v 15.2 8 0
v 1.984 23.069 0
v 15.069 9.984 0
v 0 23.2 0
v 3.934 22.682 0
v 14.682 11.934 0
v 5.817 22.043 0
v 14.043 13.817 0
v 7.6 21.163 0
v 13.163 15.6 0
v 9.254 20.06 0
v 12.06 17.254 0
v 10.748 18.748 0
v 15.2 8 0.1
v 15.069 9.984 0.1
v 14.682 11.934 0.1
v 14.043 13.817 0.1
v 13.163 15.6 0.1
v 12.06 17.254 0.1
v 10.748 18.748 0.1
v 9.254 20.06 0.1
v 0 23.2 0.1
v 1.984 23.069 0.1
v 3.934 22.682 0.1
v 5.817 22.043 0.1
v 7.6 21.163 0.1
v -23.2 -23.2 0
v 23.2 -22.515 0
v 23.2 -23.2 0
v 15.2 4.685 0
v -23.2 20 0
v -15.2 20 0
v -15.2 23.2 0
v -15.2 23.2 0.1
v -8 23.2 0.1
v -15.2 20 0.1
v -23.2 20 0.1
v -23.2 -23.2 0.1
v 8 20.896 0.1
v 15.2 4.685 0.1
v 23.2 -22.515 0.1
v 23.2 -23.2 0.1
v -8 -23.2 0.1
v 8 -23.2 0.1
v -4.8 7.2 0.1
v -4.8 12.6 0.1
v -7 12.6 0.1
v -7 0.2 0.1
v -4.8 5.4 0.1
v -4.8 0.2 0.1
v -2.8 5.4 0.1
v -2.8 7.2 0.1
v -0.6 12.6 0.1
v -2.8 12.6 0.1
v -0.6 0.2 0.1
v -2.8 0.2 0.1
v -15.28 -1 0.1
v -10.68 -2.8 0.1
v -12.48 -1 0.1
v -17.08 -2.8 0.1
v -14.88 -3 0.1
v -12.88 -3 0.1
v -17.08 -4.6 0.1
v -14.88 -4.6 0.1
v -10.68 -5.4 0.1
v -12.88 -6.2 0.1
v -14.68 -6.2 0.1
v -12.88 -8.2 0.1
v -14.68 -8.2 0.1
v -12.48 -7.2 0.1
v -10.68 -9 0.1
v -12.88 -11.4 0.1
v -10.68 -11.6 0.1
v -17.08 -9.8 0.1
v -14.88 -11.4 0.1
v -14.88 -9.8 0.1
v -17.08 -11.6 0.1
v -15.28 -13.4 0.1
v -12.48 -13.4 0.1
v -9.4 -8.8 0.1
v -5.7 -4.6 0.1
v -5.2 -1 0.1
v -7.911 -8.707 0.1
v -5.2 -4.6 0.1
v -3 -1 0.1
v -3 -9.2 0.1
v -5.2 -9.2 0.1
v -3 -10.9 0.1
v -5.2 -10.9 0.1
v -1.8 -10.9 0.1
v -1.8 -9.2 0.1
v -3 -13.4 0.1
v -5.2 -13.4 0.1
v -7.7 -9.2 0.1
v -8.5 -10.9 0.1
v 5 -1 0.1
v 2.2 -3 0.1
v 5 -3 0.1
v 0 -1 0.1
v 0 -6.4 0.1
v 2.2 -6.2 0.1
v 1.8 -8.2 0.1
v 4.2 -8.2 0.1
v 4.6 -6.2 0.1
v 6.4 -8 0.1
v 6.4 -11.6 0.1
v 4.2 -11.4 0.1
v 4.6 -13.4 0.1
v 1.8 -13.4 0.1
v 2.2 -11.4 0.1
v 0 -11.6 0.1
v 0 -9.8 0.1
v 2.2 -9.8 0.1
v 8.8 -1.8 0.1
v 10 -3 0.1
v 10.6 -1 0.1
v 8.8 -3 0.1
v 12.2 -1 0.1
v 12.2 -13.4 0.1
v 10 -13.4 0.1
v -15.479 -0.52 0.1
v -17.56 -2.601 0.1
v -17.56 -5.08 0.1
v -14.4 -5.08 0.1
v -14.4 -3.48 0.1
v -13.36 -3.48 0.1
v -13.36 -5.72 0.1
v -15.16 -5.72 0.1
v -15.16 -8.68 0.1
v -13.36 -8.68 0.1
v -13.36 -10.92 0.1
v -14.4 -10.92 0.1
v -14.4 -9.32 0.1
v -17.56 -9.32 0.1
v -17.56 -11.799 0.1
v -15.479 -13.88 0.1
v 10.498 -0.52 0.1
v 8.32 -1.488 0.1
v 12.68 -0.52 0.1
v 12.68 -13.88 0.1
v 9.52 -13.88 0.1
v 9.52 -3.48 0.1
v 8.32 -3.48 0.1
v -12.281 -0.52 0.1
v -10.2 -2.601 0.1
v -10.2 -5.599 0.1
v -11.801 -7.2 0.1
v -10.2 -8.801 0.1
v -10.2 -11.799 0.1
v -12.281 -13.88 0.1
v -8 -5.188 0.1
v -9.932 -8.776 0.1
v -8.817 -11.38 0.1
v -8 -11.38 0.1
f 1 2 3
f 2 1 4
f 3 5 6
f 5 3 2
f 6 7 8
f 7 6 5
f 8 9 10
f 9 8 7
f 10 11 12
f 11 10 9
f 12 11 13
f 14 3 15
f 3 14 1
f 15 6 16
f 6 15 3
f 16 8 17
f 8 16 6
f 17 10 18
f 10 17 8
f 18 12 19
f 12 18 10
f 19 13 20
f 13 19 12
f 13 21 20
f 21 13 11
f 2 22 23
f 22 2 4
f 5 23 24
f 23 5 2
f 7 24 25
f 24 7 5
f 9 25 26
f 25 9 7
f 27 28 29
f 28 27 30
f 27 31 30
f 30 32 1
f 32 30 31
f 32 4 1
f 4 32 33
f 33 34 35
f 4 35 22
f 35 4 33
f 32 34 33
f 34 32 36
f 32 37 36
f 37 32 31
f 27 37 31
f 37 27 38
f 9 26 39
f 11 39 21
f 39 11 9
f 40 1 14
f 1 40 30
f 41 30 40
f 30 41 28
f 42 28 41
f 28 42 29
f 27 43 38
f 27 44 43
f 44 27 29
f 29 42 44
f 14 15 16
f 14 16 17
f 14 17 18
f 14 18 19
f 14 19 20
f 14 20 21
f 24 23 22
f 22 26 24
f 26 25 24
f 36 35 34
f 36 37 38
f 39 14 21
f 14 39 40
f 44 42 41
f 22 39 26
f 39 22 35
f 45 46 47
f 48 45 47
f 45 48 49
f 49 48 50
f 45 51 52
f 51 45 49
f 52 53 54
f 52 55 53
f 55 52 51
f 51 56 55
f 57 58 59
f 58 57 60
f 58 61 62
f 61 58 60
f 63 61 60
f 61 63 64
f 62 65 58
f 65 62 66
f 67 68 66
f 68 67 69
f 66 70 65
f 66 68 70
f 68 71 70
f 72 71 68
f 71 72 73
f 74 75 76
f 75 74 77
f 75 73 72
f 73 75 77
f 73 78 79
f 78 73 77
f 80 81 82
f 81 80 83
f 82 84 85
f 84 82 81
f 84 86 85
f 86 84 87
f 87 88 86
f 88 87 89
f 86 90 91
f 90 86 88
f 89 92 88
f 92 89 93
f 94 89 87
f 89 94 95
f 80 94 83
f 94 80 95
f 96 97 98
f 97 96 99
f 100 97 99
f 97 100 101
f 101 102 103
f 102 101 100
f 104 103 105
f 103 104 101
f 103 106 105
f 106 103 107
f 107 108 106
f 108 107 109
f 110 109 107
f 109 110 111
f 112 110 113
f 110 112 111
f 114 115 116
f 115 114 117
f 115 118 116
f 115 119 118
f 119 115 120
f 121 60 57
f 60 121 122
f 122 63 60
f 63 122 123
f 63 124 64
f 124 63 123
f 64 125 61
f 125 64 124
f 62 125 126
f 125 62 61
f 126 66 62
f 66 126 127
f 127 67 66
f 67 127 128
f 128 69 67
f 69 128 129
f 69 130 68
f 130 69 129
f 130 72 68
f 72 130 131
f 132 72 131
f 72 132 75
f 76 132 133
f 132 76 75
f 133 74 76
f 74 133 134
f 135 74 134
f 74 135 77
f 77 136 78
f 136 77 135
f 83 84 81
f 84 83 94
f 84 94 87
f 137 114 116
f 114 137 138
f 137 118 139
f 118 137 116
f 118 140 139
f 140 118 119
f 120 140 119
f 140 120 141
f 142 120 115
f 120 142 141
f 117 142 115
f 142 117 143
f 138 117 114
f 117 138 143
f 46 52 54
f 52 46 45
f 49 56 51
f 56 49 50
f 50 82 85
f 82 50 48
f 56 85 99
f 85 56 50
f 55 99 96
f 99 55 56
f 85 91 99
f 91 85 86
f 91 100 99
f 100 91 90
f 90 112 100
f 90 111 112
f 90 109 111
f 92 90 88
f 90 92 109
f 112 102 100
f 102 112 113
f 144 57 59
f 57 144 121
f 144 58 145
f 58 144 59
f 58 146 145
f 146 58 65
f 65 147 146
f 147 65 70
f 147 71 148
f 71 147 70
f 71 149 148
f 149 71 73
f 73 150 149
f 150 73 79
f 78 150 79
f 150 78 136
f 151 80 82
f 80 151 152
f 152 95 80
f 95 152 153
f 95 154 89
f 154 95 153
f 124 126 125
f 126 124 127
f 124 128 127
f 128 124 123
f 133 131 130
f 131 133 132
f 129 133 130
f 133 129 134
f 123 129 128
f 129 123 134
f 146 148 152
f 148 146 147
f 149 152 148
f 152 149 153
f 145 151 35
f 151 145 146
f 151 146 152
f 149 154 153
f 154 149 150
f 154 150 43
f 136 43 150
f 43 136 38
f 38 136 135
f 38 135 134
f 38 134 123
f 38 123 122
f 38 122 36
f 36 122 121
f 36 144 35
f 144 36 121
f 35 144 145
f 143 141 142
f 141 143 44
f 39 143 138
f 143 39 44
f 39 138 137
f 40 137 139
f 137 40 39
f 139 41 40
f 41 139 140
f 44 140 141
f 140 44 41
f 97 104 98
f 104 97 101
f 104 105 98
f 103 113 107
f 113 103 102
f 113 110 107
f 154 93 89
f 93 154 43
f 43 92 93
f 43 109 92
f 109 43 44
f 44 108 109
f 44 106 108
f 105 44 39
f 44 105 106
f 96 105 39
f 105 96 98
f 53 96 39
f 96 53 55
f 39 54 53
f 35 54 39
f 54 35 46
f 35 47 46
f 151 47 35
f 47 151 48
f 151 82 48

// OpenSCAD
// file: ../p/48/7-48cyli.scad
use <../../lib.scad>
function ldraw_lib__48__7_48cyli() = [
// 0 Hi-Res Cylinder 0.1458
// 0 Name: 48\7-48cyli.dat
// 0 Author: Philippe Hurbain [Philo]
// 0 !LDRAW_ORG 48_Primitive UPDATE 2013-01
// 0 !LICENSE Licensed under CC BY 4.0 : see CAreadme.txt
// 
// 0 BFC CERTIFY CCW
  [0,"BFC","CERTIFY"],
  [0,"BFC","CCW"],
// 
// 0 !HISTORY 2013-07-21 [PTadmin] Official Update 2013-01
// 
// 
// 4 16 0.9914 0 0.1305 1 0 0 1 1 0 0.9914 1 0.1305
  [4,16,0.9914,0,0.1305,1,0,0,1,1,0,0.9914,1,0.1305],
// 4 16 0.9659 0 0.2588 0.9914 0 0.1305 0.9914 1 0.1305 0.9659 1 0.2588
  [4,16,0.9659,0,0.2588,0.9914,0,0.1305,0.9914,1,0.1305,0.9659,1,0.2588],
// 4 16 0.9239 0 0.3827 0.9659 0 0.2588 0.9659 1 0.2588 0.9239 1 0.3827
  [4,16,0.9239,0,0.3827,0.9659,0,0.2588,0.9659,1,0.2588,0.9239,1,0.3827],
// 4 16 0.866 0 0.5 0.9239 0 0.3827 0.9239 1 0.3827 0.866 1 0.5
  [4,16,0.866,0,0.5,0.9239,0,0.3827,0.9239,1,0.3827,0.866,1,0.5],
// 4 16 0.7934 0 0.6088 0.866 0 0.5 0.866 1 0.5 0.7934 1 0.6088
  [4,16,0.7934,0,0.6088,0.866,0,0.5,0.866,1,0.5,0.7934,1,0.6088],
// 4 16 0.7071 0 0.7071 0.7934 0 0.6088 0.7934 1 0.6088 0.7071 1 0.7071
  [4,16,0.7071,0,0.7071,0.7934,0,0.6088,0.7934,1,0.6088,0.7071,1,0.7071],
// 4 16 0.6088 0 0.7934 0.7071 0 0.7071 0.7071 1 0.7071 0.6088 1 0.7934
  [4,16,0.6088,0,0.7934,0.7071,0,0.7071,0.7071,1,0.7071,0.6088,1,0.7934],
// 0 // conditional lines
// 5 24 1 1 0 1 0 0 1 1 -0.1317 0.9914 1 0.1305
  [5,24,1,1,0,1,0,0,1,1,-0.1317,0.9914,1,0.1305],
// 5 24 0.9914 1 0.1305 0.9914 0 0.1305 1 1 0 0.9659 1 0.2588
  [5,24,0.9914,1,0.1305,0.9914,0,0.1305,1,1,0,0.9659,1,0.2588],
// 5 24 0.9659 1 0.2588 0.9659 0 0.2588 0.9914 1 0.1305 0.9239 1 0.3827
  [5,24,0.9659,1,0.2588,0.9659,0,0.2588,0.9914,1,0.1305,0.9239,1,0.3827],
// 5 24 0.9239 1 0.3827 0.9239 0 0.3827 0.9659 1 0.2588 0.866 1 0.5
  [5,24,0.9239,1,0.3827,0.9239,0,0.3827,0.9659,1,0.2588,0.866,1,0.5],
// 5 24 0.866 1 0.5 0.866 0 0.5 0.9239 1 0.3827 0.7934 1 0.6088
  [5,24,0.866,1,0.5,0.866,0,0.5,0.9239,1,0.3827,0.7934,1,0.6088],
// 5 24 0.7934 1 0.6088 0.7934 0 0.6088 0.866 1 0.5 0.7071 1 0.7071
  [5,24,0.7934,1,0.6088,0.7934,0,0.6088,0.866,1,0.5,0.7071,1,0.7071],
// 5 24 0.7071 1 0.7071 0.7071 0 0.7071 0.7934 1 0.6088 0.6088 1 0.7934
  [5,24,0.7071,1,0.7071,0.7071,0,0.7071,0.7934,1,0.6088,0.6088,1,0.7934],
// 5 24 0.6088 1 0.7934 0.6088 0 0.7934 0.7071 1 0.7071 0.5043 1 0.8735
  [5,24,0.6088,1,0.7934,0.6088,0,0.7934,0.7071,1,0.7071,0.5043,1,0.8735],
// 0 // Build by Primitive Generator 2
];
module ldraw_lib__48__7_48cyli(step=0, col=false, unit=2/5, alt=false, line=0.2, solid=!$preview)
    makepoly(ldraw_lib__48__7_48cyli(), step=step, col=col, unit=unit, alt=alt, line=line, solid=solid);
ldraw_lib__48__7_48cyli(line=0.2);
// file: ../p/48/7-48chrd.scad
use <../../lib.scad>
function ldraw_lib__48__7_48chrd() = [
// 0 Hi-Res Chord 0.1458
// 0 Name: 48\7-48chrd.dat
// 0 Author: Philippe Hurbain [Philo]
// 0 !LDRAW_ORG 48_Primitive UPDATE 2013-01
// 0 !LICENSE Licensed under CC BY 4.0 : see CAreadme.txt
// 
// 0 BFC CERTIFY CCW
  [0,"BFC","CERTIFY"],
  [0,"BFC","CCW"],
// 
// 0 !HISTORY 2013-07-21 [PTadmin] Official Update 2013-01
// 
// 
// 3 16 1 0 0 0.9914 0 0.1305 0.9659 0 0.2588
  [3,16,1,0,0,0.9914,0,0.1305,0.9659,0,0.2588],
// 3 16 1 0 0 0.9659 0 0.2588 0.9239 0 0.3827
  [3,16,1,0,0,0.9659,0,0.2588,0.9239,0,0.3827],
// 3 16 1 0 0 0.9239 0 0.3827 0.866 0 0.5
  [3,16,1,0,0,0.9239,0,0.3827,0.866,0,0.5],
// 3 16 1 0 0 0.866 0 0.5 0.7934 0 0.6088
  [3,16,1,0,0,0.866,0,0.5,0.7934,0,0.6088],
// 3 16 1 0 0 0.7934 0 0.6088 0.7071 0 0.7071
  [3,16,1,0,0,0.7934,0,0.6088,0.7071,0,0.7071],
// 3 16 1 0 0 0.7071 0 0.7071 0.6088 0 0.7934
  [3,16,1,0,0,0.7071,0,0.7071,0.6088,0,0.7934],
// 0 // Build by Primitive Generator 2
];
module ldraw_lib__48__7_48chrd(step=0, col=false, unit=2/5, alt=false, line=0.2, solid=!$preview)
    makepoly(ldraw_lib__48__7_48chrd(), step=step, col=col, unit=unit, alt=alt, line=line, solid=solid);
ldraw_lib__48__7_48chrd(line=0.2);
// file: ../p/48/1-4chrd.scad
use <../../lib.scad>
function ldraw_lib__48__1_4chrd() = [
// 0 Hi-Res Chord 0.25
// 0 Name: 48\1-4chrd.dat
// 0 Author: Willy Tschager [Holly-Wood]
// 0 !LDRAW_ORG 48_Primitive UPDATE 2024-01
// 0 !LICENSE Licensed under CC BY 4.0 : see CAreadme.txt
// 
// 0 BFC CERTIFY CCW
  [0,"BFC","CERTIFY"],
  [0,"BFC","CCW"],
// 
// 0 !HISTORY 2009-05-02 [PTadmin] Official Update 2009-01
// 0 !HISTORY 2012-08-02 [MMR1988] Re-creation with PrimGen2 and Rectifier
// 0 !HISTORY 2012-08-09 [PTadmin] Official Update 2012-02
// 0 !HISTORY 2024-01-04 [Holly-Wood] Complete re-write, original by westrate
// 0 !HISTORY 2024-01-29 [OrionP] Official Update 2024-01
// 
// 0 // Vertices calculated by LDPartEditor (PrimGen 2.X)
// 
// 4 16 0 0 1 1 0 0 .9914 0 .1305 .1305 0 .9914
  [4,16,0,0,1,1,0,0,.9914,0,.1305,.1305,0,.9914],
// 4 16 .1305 0 .9914 .9914 0 .1305 .9659 0 .2588 .2588 0 .9659
  [4,16,.1305,0,.9914,.9914,0,.1305,.9659,0,.2588,.2588,0,.9659],
// 4 16 .2588 0 .9659 .9659 0 .2588 .9239 0 .3827 .3827 0 .9239
  [4,16,.2588,0,.9659,.9659,0,.2588,.9239,0,.3827,.3827,0,.9239],
// 4 16 .3827 0 .9239 .9239 0 .3827 .866 0 .5 .5 0 .866
  [4,16,.3827,0,.9239,.9239,0,.3827,.866,0,.5,.5,0,.866],
// 4 16 .5 0 .866 .866 0 .5 .7934 0 .6088 .6088 0 .7934
  [4,16,.5,0,.866,.866,0,.5,.7934,0,.6088,.6088,0,.7934],
// 3 16 .6088 0 .7934 .7934 0 .6088 .7071 0 .7071
  [3,16,.6088,0,.7934,.7934,0,.6088,.7071,0,.7071],
];
module ldraw_lib__48__1_4chrd(step=0, col=false, unit=2/5, alt=false, line=0.2, solid=!$preview)
    makepoly(ldraw_lib__48__1_4chrd(), step=step, col=col, unit=unit, alt=alt, line=line, solid=solid);
ldraw_lib__48__1_4chrd(line=0.2);
// file: ../p/48/1-12cyli.scad
use <../../lib.scad>
function ldraw_lib__48__1_12cyli() = [
// 0 Hi-Res Cylinder 0.0833
// 0 Name: 48\1-12cyli.dat
// 0 Author: Willy Tschager [Holly-Wood]
// 0 !LDRAW_ORG 48_Primitive UPDATE 2024-01
// 0 !LICENSE Licensed under CC BY 4.0 : see CAreadme.txt
// 
// 0 BFC CERTIFY CCW
  [0,"BFC","CERTIFY"],
  [0,"BFC","CCW"],
// 
// 0 !HISTORY 2009-05-02 [PTadmin] Official Update 2009-01
// 0 !HISTORY 2024-01-08 [Holly-Wood] Complete regeneration, original by westrate
// 0 !HISTORY 2024-01-29 [OrionP] Official Update 2024-01
// 
// 4 16 0.9914 0 0.1305 1 0 0 1 1 0 0.9914 1 0.1305
  [4,16,0.9914,0,0.1305,1,0,0,1,1,0,0.9914,1,0.1305],
// 4 16 0.9659 0 0.2588 0.9914 0 0.1305 0.9914 1 0.1305 0.9659 1 0.2588
  [4,16,0.9659,0,0.2588,0.9914,0,0.1305,0.9914,1,0.1305,0.9659,1,0.2588],
// 4 16 0.9239 0 0.3827 0.9659 0 0.2588 0.9659 1 0.2588 0.9239 1 0.3827
  [4,16,0.9239,0,0.3827,0.9659,0,0.2588,0.9659,1,0.2588,0.9239,1,0.3827],
// 4 16 0.866 0 0.5 0.9239 0 0.3827 0.9239 1 0.3827 0.866 1 0.5
  [4,16,0.866,0,0.5,0.9239,0,0.3827,0.9239,1,0.3827,0.866,1,0.5],
// 0 // conditional lines
// 5 24 1 1 0 1 0 0 1 1 -0.1317 0.9914 1 0.1305
  [5,24,1,1,0,1,0,0,1,1,-0.1317,0.9914,1,0.1305],
// 5 24 0.9914 1 0.1305 0.9914 0 0.1305 1 1 0 0.9659 1 0.2588
  [5,24,0.9914,1,0.1305,0.9914,0,0.1305,1,1,0,0.9659,1,0.2588],
// 5 24 0.9659 1 0.2588 0.9659 0 0.2588 0.9914 1 0.1305 0.9239 1 0.3827
  [5,24,0.9659,1,0.2588,0.9659,0,0.2588,0.9914,1,0.1305,0.9239,1,0.3827],
// 5 24 0.9239 1 0.3827 0.9239 0 0.3827 0.9659 1 0.2588 0.866 1 0.5
  [5,24,0.9239,1,0.3827,0.9239,0,0.3827,0.9659,1,0.2588,0.866,1,0.5],
// 5 24 0.866 1 0.5 0.866 0 0.5 0.9239 1 0.3827 0.8002 1 0.614
  [5,24,0.866,1,0.5,0.866,0,0.5,0.9239,1,0.3827,0.8002,1,0.614],
// 0 // Build by LDPartEditor (PrimGen 2.X)
];
module ldraw_lib__48__1_12cyli(step=0, col=false, unit=2/5, alt=false, line=0.2, solid=!$preview)
    makepoly(ldraw_lib__48__1_12cyli(), step=step, col=col, unit=unit, alt=alt, line=line, solid=solid);
ldraw_lib__48__1_12cyli(line=0.2);
// file: ../p/48/1-12chrd.scad
use <../../lib.scad>
function ldraw_lib__48__1_12chrd() = [
// 0 Hi-Res Chord 0.0833
// 0 Name: 48\1-12chrd.dat
// 0 Author: Willy Tschager [Holly-Wood]
// 0 !LDRAW_ORG 48_Primitive UPDATE 2024-01
// 0 !LICENSE Licensed under CC BY 4.0 : see CAreadme.txt
// 
// 0 BFC CERTIFY CCW
  [0,"BFC","CERTIFY"],
  [0,"BFC","CCW"],
// 
// 0 !HISTORY 2009-05-02 [PTadmin] Official Update 2009-01
// 0 !HISTORY 2024-01-09 [Holly-Wood] Complete re-write, original by westrate
// 0 !HISTORY 2024-01-29 [OrionP] Official Update 2024-01
// 
// 4 16 .866 0 .5 1 0 0 .9914 0 .1305 .9239 0 .3827
  [4,16,.866,0,.5,1,0,0,.9914,0,.1305,.9239,0,.3827],
// 3 16 .9239 0 .3827 .9914 0 .1305 .9659 0 .2588
  [3,16,.9239,0,.3827,.9914,0,.1305,.9659,0,.2588],
// 0 // Build by LDPartEditor (PrimGen 2.X)
];
module ldraw_lib__48__1_12chrd(step=0, col=false, unit=2/5, alt=false, line=0.2, solid=!$preview)
    makepoly(ldraw_lib__48__1_12chrd(), step=step, col=col, unit=unit, alt=alt, line=line, solid=solid);
ldraw_lib__48__1_12chrd(line=0.2);
// file: s/4162510as01.scad
use <../../lib.scad>
use <../../p/48/1-12chrd.scad>
use <../../p/48/1-12cyli.scad>
use <../../p/48/1-4chrd.scad>
use <../../p/48/7-48chrd.scad>
use <../../p/48/7-48cyli.scad>
function ldraw_lib__s__4162510as01() = [
// 0 ~Sticker  5.8 x  5.8 with Black "H3451" on Blue, Red and White Stripes Left - Common Part
// 0 Name: s\4162510as01.dat
// 0 Author: Massimo Maso [Sirio]
// 0 !LDRAW_ORG Subpart UPDATE 2024-09
// 0 !LICENSE Licensed under CC BY 4.0 : see CAreadme.txt
// 
// 0 BFC CERTIFY CCW
  [0,"BFC","CERTIFY"],
  [0,"BFC","CCW"],
// 
// 0 !HISTORY 2024-10-27 [OrionP] Official Update 2024-09
// 
// 
// 0 // Primitives
// 1 16 0 0 20 38 0 0 0 -1 0 0 0 38 48\1-4chrd.dat
  [1,16,0,0,20,38,0,0,0,-1,0,0,0,38, ldraw_lib__48__1_4chrd()],
// 1 16 0 -0.25 20 38 0 0 0 0.25 0 0 0 38 48\7-48cyli.dat
  [1,16,0,-0.25,20,38,0,0,0,0.25,0,0,0,38, ldraw_lib__48__7_48cyli()],
// 1 16 0 -0.25 20 0 0 38 0 0.25 0 38 0 0 48\1-12cyli.dat
  [1,16,0,-0.25,20,0,0,38,0,0.25,0,38,0,0, ldraw_lib__48__1_12cyli()],
// 0 // Bottom face
// 4 16 -58 0 -58 38 0 11.712 58 0 -56.288 58 0 -58
  [4,16,-58,0,-58,38,0,11.712,58,0,-56.288,58,0,-58],
// 3 16 -58 0 -58 -58 0 50 38 0 11.712
  [3,16,-58,0,-58,-58,0,50,38,0,11.712],
// 4 16 -38 0 50 38 0 20 38 0 11.712 -58 0 50
  [4,16,-38,0,50,38,0,20,38,0,11.712,-58,0,50],
// 4 16 -38 0 50 -38 0 58 0 0 58 38 0 20
  [4,16,-38,0,50,-38,0,58,0,0,58,38,0,20],
// 0 // Lateral face
// 3 16 -38 0 58 -38 -.25 58 -20 -.25 58
  [3,16,-38,0,58,-38,-.25,58,-20,-.25,58],
// 4 16 -38 0 58 -20 -.25 58 0 -.25 58 0 0 58
  [4,16,-38,0,58,-20,-.25,58,0,-.25,58,0,0,58],
// 4 16 -38 0 58 -38 0 50 -38 -.25 50 -38 -.25 58
  [4,16,-38,0,58,-38,0,50,-38,-.25,50,-38,-.25,58],
// 4 16 -58 0 50 -58 -.25 50 -38 -.25 50 -38 0 50
  [4,16,-58,0,50,-58,-.25,50,-38,-.25,50,-38,0,50],
// 4 16 -58 0 50 -58 0 -58 -58 -.25 -58 -58 -.25 50
  [4,16,-58,0,50,-58,0,-58,-58,-.25,-58,-58,-.25,50],
// 3 16 19 0 52.908 19 -.25 52.908 20 -.25 52.24072
  [3,16,19,0,52.908,19,-.25,52.908,20,-.25,52.24072],
// 4 16 19 0 52.908 20 -.25 52.24072 23.1344 -.25 50.1492 23.1344 0 50.1492
  [4,16,19,0,52.908,20,-.25,52.24072,23.1344,-.25,50.1492,23.1344,0,50.1492],
// 4 16 38 0 11.712 38 0 20 38 -.25 20 38 -.25 11.712
  [4,16,38,0,11.712,38,0,20,38,-.25,20,38,-.25,11.712],
// 4 16 38 0 11.712 38 -.25 11.712 58 -.25 -56.288 58 0 -56.288
  [4,16,38,0,11.712,38,-.25,11.712,58,-.25,-56.288,58,0,-56.288],
// 4 16 58 0 -58 58 0 -56.288 58 -.25 -56.288 58 -.25 -58
  [4,16,58,0,-58,58,0,-56.288,58,-.25,-56.288,58,-.25,-58],
// 3 16 -58 0 -58 -20 -.25 -58 -58 -.25 -58
  [3,16,-58,0,-58,-20,-.25,-58,-58,-.25,-58],
// 4 16 -58 0 -58 58 0 -58 20 -.25 -58 -20 -.25 -58
  [4,16,-58,0,-58,58,0,-58,20,-.25,-58,-20,-.25,-58],
// 3 16 58 0 -58 58 -.25 -58 20 -.25 -58
  [3,16,58,0,-58,58,-.25,-58,20,-.25,-58],
// 0 // Conditional lines
// 5 24 23.1344 0 50.1492 23.1344 -.25 50.1492 26.8698 0 46.8698 19 0 52.908
  [5,24,23.1344,0,50.1492,23.1344,-.25,50.1492,26.8698,0,46.8698,19,0,52.908],
// 5 24 19 0 52.908 19 -.25 52.908 14.5426 0 55.1082 23.1344 0 50.1492
  [5,24,19,0,52.908,19,-.25,52.908,14.5426,0,55.1082,23.1344,0,50.1492],
// 0 // Top faces
// 0 // Primitives
// 1 4 0 -0.25 20 38 0 0 0 1 0 0 0 38 48\7-48chrd.dat
  [1,4,0,-0.25,20,38,0,0,0,1,0,0,0,38, ldraw_lib__48__7_48chrd()],
// 1 15 0 -0.25 20 0 0 38 0 1 0 38 0 0 48\1-12chrd.dat
  [1,15,0,-0.25,20,0,0,38,0,1,0,38,0,0, ldraw_lib__48__1_12chrd()],
// 0 // Blue faces
// 3 1 -38 -.25 50 -20 -.25 58 -38 -.25 58
  [3,1,-38,-.25,50,-20,-.25,58,-38,-.25,58],
// 3 1 -38 -.25 50 -58 -.25 50 -58 -.25 -58
  [3,1,-38,-.25,50,-58,-.25,50,-58,-.25,-58],
// 0 // Red faces
// 4 4 20 -.25 52.24072 38 -.25 11.712 38 -.25 20 23.1344 -.25 50.1492
  [4,4,20,-.25,52.24072,38,-.25,11.712,38,-.25,20,23.1344,-.25,50.1492],
// 3 4 20 -.25 -58 58 -.25 -58 58 -.25 -56.288
  [3,4,20,-.25,-58,58,-.25,-58,58,-.25,-56.288],
// 0 // White face
// 4 15 20 -.25 52.24072 19 -.25 52.908 0 -.25 58 -20 -.25 58
  [4,15,20,-.25,52.24072,19,-.25,52.908,0,-.25,58,-20,-.25,58],
];
module ldraw_lib__s__4162510as01(step=0, col=false, unit=2/5, alt=false, line=0.2, solid=!$preview)
    makepoly(ldraw_lib__s__4162510as01(), step=step, col=col, unit=unit, alt=alt, line=line, solid=solid);
ldraw_lib__s__4162510as01(line=0.2);
// main file
use <../lib.scad>
use <s/4162510as01.scad>
use <s/4162510as02.scad>
function ldraw_lib__4162510a() = [
// 0 Sticker  5.8 x  5.8 with Black "H3451" on Blue, Red and White Stripes Left
// 0 Name: 4162510a.dat
// 0 Author: Massimo Maso [Sirio]
// 0 !LDRAW_ORG Part UPDATE 2024-09
// 0 !LICENSE Licensed under CC BY 4.0 : see CAreadme.txt
// 
// 0 BFC CERTIFY CCW
  [0,"BFC","CERTIFY"],
  [0,"BFC","CCW"],
// 
// 0 !KEYWORDS Biplane, Camel, Sculptures, Set 3451, Sopwith
// 
// 0 !HISTORY 2024-10-27 [OrionP] Official Update 2024-09
// 
// 
// 0 // Subparts
// 1 16 0 0 0 1 0 0 0 1 0 0 0 1 s\4162510as01.dat
  [1,16,0,0,0,1,0,0,0,1,0,0,0,1, ldraw_lib__s__4162510as01()],
// 1 16 0 0 0 1 0 0 0 1 0 0 0 1 s\4162510as02.dat
  [1,16,0,0,0,1,0,0,0,1,0,0,0,1, ldraw_lib__s__4162510as02()],
// 0 // Top faces
// 0 // Frame of number "3"
// 4 15 -31.2 -.25 -2.5 -30.7029 -.25 -1.3 -38.6971 -.25 -1.3 -38.2 -.25 -2.5
  [4,15,-31.2,-.25,-2.5,-30.7029,-.25,-1.3,-38.6971,-.25,-1.3,-38.2,-.25,-2.5],
// 4 15 -31.2 -.25 -2.5 -26.7 -.25 -7 -25.5 -.25 -6.5029 -30.7029 -.25 -1.3
  [4,15,-31.2,-.25,-2.5,-26.7,-.25,-7,-25.5,-.25,-6.5029,-30.7029,-.25,-1.3],
// 4 15 -26.7 -.25 -13.5 -25.5 -.25 -13.9971 -25.5 -.25 -6.5029 -26.7 -.25 -7
  [4,15,-26.7,-.25,-13.5,-25.5,-.25,-13.9971,-25.5,-.25,-6.5029,-26.7,-.25,-7],
// 4 15 -26.7 -.25 -13.5 -31.2 -.25 -18 -29.5029 -.25 -18 -25.5 -.25 -13.9971
  [4,15,-26.7,-.25,-13.5,-31.2,-.25,-18,-29.5029,-.25,-18,-25.5,-.25,-13.9971],
// 4 15 -26.7 -.25 -22.5 -25.5 -.25 -22.0029 -29.5029 -.25 -18 -31.2 -.25 -18
  [4,15,-26.7,-.25,-22.5,-25.5,-.25,-22.0029,-29.5029,-.25,-18,-31.2,-.25,-18],
// 4 15 -26.7 -.25 -22.5 -26.7 -.25 -29 -25.5 -.25 -29.4971 -25.5 -.25 -22.0029
  [4,15,-26.7,-.25,-22.5,-26.7,-.25,-29,-25.5,-.25,-29.4971,-25.5,-.25,-22.0029],
// 4 15 -31.2 -.25 -33.5 -30.7029 -.25 -34.7 -25.5 -.25 -29.4971 -26.7 -.25 -29
  [4,15,-31.2,-.25,-33.5,-30.7029,-.25,-34.7,-25.5,-.25,-29.4971,-26.7,-.25,-29],
// 4 15 -31.2 -.25 -33.5 -38.2 -.25 -33.5 -38.6971 -.25 -34.7 -30.7029 -.25 -34.7
  [4,15,-31.2,-.25,-33.5,-38.2,-.25,-33.5,-38.6971,-.25,-34.7,-30.7029,-.25,-34.7],
// 0 // Frame of number "4"
// 4 15 -23.5 -.25 -22 -13 -.25 -2.5 -20 -.25 -12.9689 -24.831 -.25 -21.9407
  [4,15,-23.5,-.25,-22,-13,-.25,-2.5,-20,-.25,-12.9689,-24.831,-.25,-21.9407],
// 4 15 -23.5 -.25 -22 -24.831 -.25 -21.9407 -22.0413 -.25 -28.45 -21.25 -.25 -27.25
  [4,15,-23.5,-.25,-22,-24.831,-.25,-21.9407,-22.0413,-.25,-28.45,-21.25,-.25,-27.25],
// 4 15 -21.25 -.25 -27.25 -22.0413 -.25 -28.45 -20 -.25 -28.45 -13 -.25 -27.25
  [4,15,-21.25,-.25,-27.25,-22.0413,-.25,-28.45,-20,-.25,-28.45,-13,-.25,-27.25],
// 0 // Blue faces
// 4 1 -33.4 -.25 -14.3 -33.4 -.25 -8.7 -36 -.25 -8.7 -36 -.25 -12.7
  [4,1,-33.4,-.25,-14.3,-33.4,-.25,-8.7,-36,-.25,-8.7,-36,-.25,-12.7],
// 4 1 -33.4 -.25 -14.3 -36 -.25 -12.7 -43.9 -.25 -12.7 -37.9 -.25 -14.3
  [4,1,-33.4,-.25,-14.3,-36,-.25,-12.7,-43.9,-.25,-12.7,-37.9,-.25,-14.3],
// 4 1 -33.4 -.25 -21.7 -36 -.25 -23.3 -36 -.25 -27.3 -33.4 -.25 -27.3
  [4,1,-33.4,-.25,-21.7,-36,-.25,-23.3,-36,-.25,-27.3,-33.4,-.25,-27.3],
// 4 1 -33.4 -.25 -21.7 -37.9 -.25 -21.7 -43.9 -.25 -23.3 -36 -.25 -23.3
  [4,1,-33.4,-.25,-21.7,-37.9,-.25,-21.7,-43.9,-.25,-23.3,-36,-.25,-23.3],
// 4 1 -37.9 -.25 -21.7 -37.9 -.25 -14.3 -43.9 -.25 -12.7 -43.9 -.25 -23.3
  [4,1,-37.9,-.25,-21.7,-37.9,-.25,-14.3,-43.9,-.25,-12.7,-43.9,-.25,-23.3],
// 4 1 -24.831 -.25 -21.9407 -25.5 -.25 -13.9971 -29.5029 -.25 -18 -25.5 -.25 -22.0029
  [4,1,-24.831,-.25,-21.9407,-25.5,-.25,-13.9971,-29.5029,-.25,-18,-25.5,-.25,-22.0029],
// 4 1 -24.831 -.25 -21.9407 -25.5 -.25 -22.0029 -25.5 -.25 -29.4971 -22.0413 -.25 -28.45
  [4,1,-24.831,-.25,-21.9407,-25.5,-.25,-22.0029,-25.5,-.25,-29.4971,-22.0413,-.25,-28.45],
// 4 1 -20 -.25 -12.9689 -20 -.25 58 -25.5 -.25 -6.5029 -25.5 -.25 -13.9971
  [4,1,-20,-.25,-12.9689,-20,-.25,58,-25.5,-.25,-6.5029,-25.5,-.25,-13.9971],
// 3 1 -20 -.25 -12.9689 -25.5 -.25 -13.9971 -24.831 -.25 -21.9407
  [3,1,-20,-.25,-12.9689,-25.5,-.25,-13.9971,-24.831,-.25,-21.9407],
// 4 1 -20 -.25 -28.45 -22.0413 -.25 -28.45 -25.5 -.25 -29.4971 -30.7029 -.25 -34.7
  [4,1,-20,-.25,-28.45,-22.0413,-.25,-28.45,-25.5,-.25,-29.4971,-30.7029,-.25,-34.7],
// 3 1 -20 -.25 -28.45 -30.7029 -.25 -34.7 -20 -.25 -58
  [3,1,-20,-.25,-28.45,-30.7029,-.25,-34.7,-20,-.25,-58],
// 4 1 -58 -.25 -58 -20 -.25 -58 -30.7029 -.25 -34.7 -38.6971 -.25 -34.7
  [4,1,-58,-.25,-58,-20,-.25,-58,-30.7029,-.25,-34.7,-38.6971,-.25,-34.7],
// 3 1 -58 -.25 -58 -38.6971 -.25 -34.7 -43.9 -.25 -29.4971
  [3,1,-58,-.25,-58,-38.6971,-.25,-34.7,-43.9,-.25,-29.4971],
// 3 1 -58 -.25 -58 -43.9 -.25 -29.4971 -43.9 -.25 -23.3
  [3,1,-58,-.25,-58,-43.9,-.25,-29.4971,-43.9,-.25,-23.3],
// 3 1 -58 -.25 -58 -43.9 -.25 -23.3 -43.9 -.25 -12.7
  [3,1,-58,-.25,-58,-43.9,-.25,-23.3,-43.9,-.25,-12.7],
// 3 1 -58 -.25 -58 -43.9 -.25 -12.7 -43.9 -.25 -6.5029
  [3,1,-58,-.25,-58,-43.9,-.25,-12.7,-43.9,-.25,-6.5029],
// 3 1 -58 -.25 -58 -43.9 -.25 -6.5029 -38 -.25 50
  [3,1,-58,-.25,-58,-43.9,-.25,-6.5029,-38,-.25,50],
// 3 1 -38 -.25 50 -43.9 -.25 -6.5029 -38.6971 -.25 -1.3
  [3,1,-38,-.25,50,-43.9,-.25,-6.5029,-38.6971,-.25,-1.3],
// 4 1 -38 -.25 50 -38.6971 -.25 -1.3 -30.7029 -.25 -1.3 -20 -.25 58
  [4,1,-38,-.25,50,-38.6971,-.25,-1.3,-30.7029,-.25,-1.3,-20,-.25,58],
// 3 1 -20 -.25 58 -30.7029 -.25 -1.3 -25.5 -.25 -6.5029
  [3,1,-20,-.25,58,-30.7029,-.25,-1.3,-25.5,-.25,-6.5029],
// 0 // Red faces
// 4 4 20 -.25 -58 23.8 -.25 -34.7 23.8 -.25 -8.7 20.8 -.25 -8.7
  [4,4,20,-.25,-58,23.8,-.25,-34.7,23.8,-.25,-8.7,20.8,-.25,-8.7],
// 4 4 20 -.25 -58 20.8 -.25 -8.7 20.8 -.25 -3.7202 20 -.25 52.24072
  [4,4,20,-.25,-58,20.8,-.25,-8.7,20.8,-.25,-3.7202,20,-.25,52.24072],
// 3 4 20 -.25 52.24072 20.8 -.25 -3.7202 26.2453 -.25 -1.3
  [3,4,20,-.25,52.24072,20.8,-.25,-3.7202,26.2453,-.25,-1.3],
// 4 4 20 -.25 52.24072 26.2453 -.25 -1.3 31.7 -.25 -1.3 38 -.25 11.712
  [4,4,20,-.25,52.24072,26.2453,-.25,-1.3,31.7,-.25,-1.3,38,-.25,11.712],
// 4 4 58 -.25 -56.288 38 -.25 11.712 31.7 -.25 -1.3 31.7 -.25 -34.7
  [4,4,58,-.25,-56.288,38,-.25,11.712,31.7,-.25,-1.3,31.7,-.25,-34.7],
// 4 4 58 -.25 -56.288 31.7 -.25 -34.7 23.8 -.25 -34.7 20 -.25 -58
  [4,4,58,-.25,-56.288,31.7,-.25,-34.7,23.8,-.25,-34.7,20,-.25,-58],
// 0 // White faces
// 4 15 11.5 -.25 -15.5 12.5 -.25 -7.5 5.5 -.25 -7.5 5.5 -.25 -15.5
  [4,15,11.5,-.25,-15.5,12.5,-.25,-7.5,5.5,-.25,-7.5,5.5,-.25,-15.5],
// 3 15 11.5 -.25 -15.5 16 -.25 -20 12.5 -.25 -7.5
  [3,15,11.5,-.25,-15.5,16,-.25,-20,12.5,-.25,-7.5],
// 4 15 5.5 -.25 -24.5 10.5 -.25 -28.5 10.5 -.25 -20.5 4.5 -.25 -20.5
  [4,15,5.5,-.25,-24.5,10.5,-.25,-28.5,10.5,-.25,-20.5,4.5,-.25,-20.5],
// 3 15 5.5 -.25 -24.5 5.5 -.25 -28.5 10.5 -.25 -28.5
  [3,15,5.5,-.25,-24.5,5.5,-.25,-28.5,10.5,-.25,-28.5],
// 4 15 -20 -.25 -58 -13 -.25 -33.5 -13 -.25 -27.25 -20 -.25 -28.45
  [4,15,-20,-.25,-58,-13,-.25,-33.5,-13,-.25,-27.25,-20,-.25,-28.45],
// 3 15 -20 -.25 -58 -7.5 -.25 -33.5 -13 -.25 -33.5
  [3,15,-20,-.25,-58,-7.5,-.25,-33.5,-13,-.25,-33.5],
// 4 15 -20 -.25 -58 20 -.25 -58 4.5 -.25 -33.5 -7.5 -.25 -33.5
  [4,15,-20,-.25,-58,20,-.25,-58,4.5,-.25,-33.5,-7.5,-.25,-33.5],
// 3 15 20 -.25 -58 11.5 -.25 -33.5 4.5 -.25 -33.5
  [3,15,20,-.25,-58,11.5,-.25,-33.5,4.5,-.25,-33.5],
// 3 15 20 -.25 -58 16 -.25 -29 11.5 -.25 -33.5
  [3,15,20,-.25,-58,16,-.25,-29,11.5,-.25,-33.5],
// 4 15 20 -.25 52.24072 16 -.25 -20 16 -.25 -29 20 -.25 -58
  [4,15,20,-.25,52.24072,16,-.25,-20,16,-.25,-29,20,-.25,-58],
// 4 15 20 -.25 52.24072 12.5 -.25 -2.5 12.5 -.25 -7.5 16 -.25 -20
  [4,15,20,-.25,52.24072,12.5,-.25,-2.5,12.5,-.25,-7.5,16,-.25,-20],
// 4 15 20 -.25 52.24072 -1.5 -.25 31.5 -1.5 -.25 .5 12.5 -.25 -2.5
  [4,15,20,-.25,52.24072,-1.5,-.25,31.5,-1.5,-.25,.5,12.5,-.25,-2.5],
// 3 15 20 -.25 52.24072 -7 -.25 31.5 -1.5 -.25 31.5
  [3,15,20,-.25,52.24072,-7,-.25,31.5,-1.5,-.25,31.5],
// 4 15 20 -.25 52.24072 -20 -.25 58 -12 -.25 31.5 -7 -.25 31.5
  [4,15,20,-.25,52.24072,-20,-.25,58,-12,-.25,31.5,-7,-.25,31.5],
// 3 15 -20 -.25 58 -17.5 -.25 31.5 -12 -.25 31.5
  [3,15,-20,-.25,58,-17.5,-.25,31.5,-12,-.25,31.5],
// 4 15 -20 -.25 58 -20 -.25 -12.9689 -17.5 -.25 .5 -17.5 -.25 31.5
  [4,15,-20,-.25,58,-20,-.25,-12.9689,-17.5,-.25,.5,-17.5,-.25,31.5],
// 3 15 -20 -.25 -12.9689 -13 -.25 -2.5 -17.5 -.25 .5
  [3,15,-20,-.25,-12.9689,-13,-.25,-2.5,-17.5,-.25,.5],
];
module ldraw_lib__4162510a(step=0, col=false, unit=2/5, alt=false, line=0.2, solid=!$preview)
    makepoly(ldraw_lib__4162510a(), step=step, col=col, unit=unit, alt=alt, line=line, solid=solid);
ldraw_lib__4162510a(line=0.2);
